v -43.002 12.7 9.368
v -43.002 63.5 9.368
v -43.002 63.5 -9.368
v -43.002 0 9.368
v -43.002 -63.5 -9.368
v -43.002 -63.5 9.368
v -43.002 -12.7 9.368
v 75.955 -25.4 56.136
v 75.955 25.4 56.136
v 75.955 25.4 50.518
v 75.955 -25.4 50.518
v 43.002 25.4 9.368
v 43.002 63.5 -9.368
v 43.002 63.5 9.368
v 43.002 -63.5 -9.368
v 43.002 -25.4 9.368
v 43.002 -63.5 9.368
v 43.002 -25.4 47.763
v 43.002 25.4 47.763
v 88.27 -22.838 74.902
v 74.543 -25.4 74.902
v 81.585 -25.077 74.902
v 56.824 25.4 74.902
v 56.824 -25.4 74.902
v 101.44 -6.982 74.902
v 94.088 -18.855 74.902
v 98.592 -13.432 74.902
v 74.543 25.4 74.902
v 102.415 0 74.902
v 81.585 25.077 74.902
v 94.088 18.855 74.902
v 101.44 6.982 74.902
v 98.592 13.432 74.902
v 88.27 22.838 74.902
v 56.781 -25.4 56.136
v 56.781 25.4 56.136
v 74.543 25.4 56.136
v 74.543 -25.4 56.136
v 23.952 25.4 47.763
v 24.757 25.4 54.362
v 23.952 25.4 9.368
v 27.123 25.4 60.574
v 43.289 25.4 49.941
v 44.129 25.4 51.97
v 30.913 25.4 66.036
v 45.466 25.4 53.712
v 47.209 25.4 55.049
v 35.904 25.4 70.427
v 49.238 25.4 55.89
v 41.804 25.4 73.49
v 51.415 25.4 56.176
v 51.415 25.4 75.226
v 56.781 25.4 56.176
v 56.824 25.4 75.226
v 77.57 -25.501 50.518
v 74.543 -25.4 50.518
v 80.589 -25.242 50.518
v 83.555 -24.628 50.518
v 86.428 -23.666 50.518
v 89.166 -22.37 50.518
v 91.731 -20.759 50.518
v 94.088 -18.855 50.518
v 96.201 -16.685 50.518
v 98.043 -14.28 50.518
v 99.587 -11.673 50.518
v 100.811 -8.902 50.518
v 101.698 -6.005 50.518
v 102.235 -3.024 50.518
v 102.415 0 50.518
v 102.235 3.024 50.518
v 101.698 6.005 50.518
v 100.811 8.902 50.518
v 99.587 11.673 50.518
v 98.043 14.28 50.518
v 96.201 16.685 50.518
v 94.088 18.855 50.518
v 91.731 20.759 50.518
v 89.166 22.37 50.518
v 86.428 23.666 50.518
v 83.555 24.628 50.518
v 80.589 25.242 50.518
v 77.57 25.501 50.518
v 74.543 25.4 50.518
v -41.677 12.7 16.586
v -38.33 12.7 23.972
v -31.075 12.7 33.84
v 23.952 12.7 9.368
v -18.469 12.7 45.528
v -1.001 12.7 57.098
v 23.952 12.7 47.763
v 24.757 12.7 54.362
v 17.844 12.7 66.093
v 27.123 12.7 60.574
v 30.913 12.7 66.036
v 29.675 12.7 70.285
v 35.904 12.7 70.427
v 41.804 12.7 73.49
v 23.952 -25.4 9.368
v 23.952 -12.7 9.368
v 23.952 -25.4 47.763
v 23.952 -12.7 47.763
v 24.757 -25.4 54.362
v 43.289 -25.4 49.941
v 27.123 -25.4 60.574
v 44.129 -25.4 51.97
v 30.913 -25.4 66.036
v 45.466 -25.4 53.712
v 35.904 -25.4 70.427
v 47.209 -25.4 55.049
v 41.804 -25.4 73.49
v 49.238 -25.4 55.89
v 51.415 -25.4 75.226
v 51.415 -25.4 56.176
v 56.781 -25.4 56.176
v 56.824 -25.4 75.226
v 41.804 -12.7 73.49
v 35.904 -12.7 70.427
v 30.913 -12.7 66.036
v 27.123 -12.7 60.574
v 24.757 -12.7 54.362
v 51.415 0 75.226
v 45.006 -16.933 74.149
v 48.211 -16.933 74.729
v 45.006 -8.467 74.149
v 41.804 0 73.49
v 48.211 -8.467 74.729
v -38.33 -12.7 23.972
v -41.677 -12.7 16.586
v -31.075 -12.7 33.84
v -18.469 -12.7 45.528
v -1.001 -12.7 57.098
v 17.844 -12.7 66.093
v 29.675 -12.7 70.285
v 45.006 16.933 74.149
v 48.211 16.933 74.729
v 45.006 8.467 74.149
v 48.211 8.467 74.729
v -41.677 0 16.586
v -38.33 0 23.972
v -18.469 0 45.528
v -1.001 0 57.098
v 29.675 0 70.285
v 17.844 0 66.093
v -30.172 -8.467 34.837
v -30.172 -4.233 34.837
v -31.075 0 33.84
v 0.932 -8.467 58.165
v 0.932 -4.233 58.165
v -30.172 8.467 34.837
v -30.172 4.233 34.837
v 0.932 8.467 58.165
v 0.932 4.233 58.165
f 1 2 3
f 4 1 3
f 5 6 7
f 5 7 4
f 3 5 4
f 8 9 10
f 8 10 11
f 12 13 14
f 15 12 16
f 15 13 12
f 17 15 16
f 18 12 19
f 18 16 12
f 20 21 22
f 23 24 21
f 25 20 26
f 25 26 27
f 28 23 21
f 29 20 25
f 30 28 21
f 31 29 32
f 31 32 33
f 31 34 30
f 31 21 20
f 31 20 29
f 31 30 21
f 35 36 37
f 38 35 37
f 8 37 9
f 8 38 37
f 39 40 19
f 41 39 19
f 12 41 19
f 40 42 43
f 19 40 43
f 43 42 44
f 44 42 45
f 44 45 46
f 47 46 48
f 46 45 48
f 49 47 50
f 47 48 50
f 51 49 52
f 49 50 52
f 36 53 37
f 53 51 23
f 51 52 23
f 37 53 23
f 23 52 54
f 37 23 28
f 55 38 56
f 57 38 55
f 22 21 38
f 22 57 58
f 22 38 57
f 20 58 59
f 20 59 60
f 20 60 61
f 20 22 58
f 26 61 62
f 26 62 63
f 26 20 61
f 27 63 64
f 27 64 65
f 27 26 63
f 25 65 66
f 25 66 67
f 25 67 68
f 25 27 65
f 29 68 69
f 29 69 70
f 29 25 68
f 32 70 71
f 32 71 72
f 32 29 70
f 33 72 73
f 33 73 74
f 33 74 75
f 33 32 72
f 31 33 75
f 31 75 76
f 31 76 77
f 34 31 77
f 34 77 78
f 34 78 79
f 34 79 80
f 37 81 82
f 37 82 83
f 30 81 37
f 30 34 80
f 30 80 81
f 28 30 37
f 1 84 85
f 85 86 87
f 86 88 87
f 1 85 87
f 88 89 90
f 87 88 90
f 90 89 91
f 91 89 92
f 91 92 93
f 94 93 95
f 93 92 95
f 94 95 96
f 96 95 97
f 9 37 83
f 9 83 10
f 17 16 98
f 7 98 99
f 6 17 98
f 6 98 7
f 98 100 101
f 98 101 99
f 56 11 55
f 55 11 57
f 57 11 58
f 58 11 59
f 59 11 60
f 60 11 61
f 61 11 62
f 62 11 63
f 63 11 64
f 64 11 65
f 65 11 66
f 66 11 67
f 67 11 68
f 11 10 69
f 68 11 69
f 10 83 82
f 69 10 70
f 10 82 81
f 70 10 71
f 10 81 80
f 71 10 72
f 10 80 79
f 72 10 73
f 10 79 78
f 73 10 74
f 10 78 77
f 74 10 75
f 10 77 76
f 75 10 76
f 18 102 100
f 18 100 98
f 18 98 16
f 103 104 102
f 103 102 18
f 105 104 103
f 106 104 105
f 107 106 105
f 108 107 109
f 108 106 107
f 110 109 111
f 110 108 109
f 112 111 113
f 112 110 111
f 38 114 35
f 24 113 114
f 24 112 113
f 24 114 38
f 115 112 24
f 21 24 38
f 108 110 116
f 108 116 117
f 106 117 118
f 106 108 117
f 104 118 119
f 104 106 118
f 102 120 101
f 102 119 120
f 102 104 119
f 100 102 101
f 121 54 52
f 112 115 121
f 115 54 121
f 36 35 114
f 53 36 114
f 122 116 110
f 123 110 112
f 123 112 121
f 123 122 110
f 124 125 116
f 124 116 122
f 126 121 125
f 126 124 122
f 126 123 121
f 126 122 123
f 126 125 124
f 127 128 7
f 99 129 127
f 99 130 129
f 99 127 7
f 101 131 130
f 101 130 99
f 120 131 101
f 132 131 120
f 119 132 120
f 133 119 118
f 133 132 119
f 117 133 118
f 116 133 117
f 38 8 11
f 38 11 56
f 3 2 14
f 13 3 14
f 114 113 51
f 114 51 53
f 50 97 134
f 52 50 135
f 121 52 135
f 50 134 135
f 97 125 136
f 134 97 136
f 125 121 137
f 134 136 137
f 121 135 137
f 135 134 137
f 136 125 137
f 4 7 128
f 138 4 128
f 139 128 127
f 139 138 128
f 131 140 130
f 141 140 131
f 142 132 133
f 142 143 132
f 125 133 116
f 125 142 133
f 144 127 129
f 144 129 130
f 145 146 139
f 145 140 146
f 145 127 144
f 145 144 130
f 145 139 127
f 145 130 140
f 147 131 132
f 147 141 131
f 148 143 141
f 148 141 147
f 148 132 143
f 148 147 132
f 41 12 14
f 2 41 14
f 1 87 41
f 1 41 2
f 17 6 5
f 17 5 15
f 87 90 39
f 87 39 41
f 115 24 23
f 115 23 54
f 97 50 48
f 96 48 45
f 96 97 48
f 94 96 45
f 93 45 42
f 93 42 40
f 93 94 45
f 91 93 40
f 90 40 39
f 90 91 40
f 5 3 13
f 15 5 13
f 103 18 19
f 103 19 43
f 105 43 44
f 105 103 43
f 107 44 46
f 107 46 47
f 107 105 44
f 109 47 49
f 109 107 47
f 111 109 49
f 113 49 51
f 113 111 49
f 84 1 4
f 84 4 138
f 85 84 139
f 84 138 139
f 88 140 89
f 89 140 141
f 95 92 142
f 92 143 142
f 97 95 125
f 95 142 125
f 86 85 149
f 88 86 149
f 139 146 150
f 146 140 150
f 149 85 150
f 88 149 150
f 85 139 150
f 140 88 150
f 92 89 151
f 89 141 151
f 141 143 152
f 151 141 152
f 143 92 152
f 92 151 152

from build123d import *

# Parameters (mm, degrees)
F1_DEPTH = 63.5
F2_DEPTH = 25.4
F3_DEPTH = 12.7
F4_W     = 19.1736370325
F4_H     = 18.7656953931
F5_DEPTH = 25.4
F8_DEPTH = 24.384


with BuildPart() as f1:
    # F0 (on Front) → F1 (new body, symmetric)
    with BuildSketch(Plane.XZ):
        Polygon((43.002218008, -9.3683367595), (43.002218008, 9.3683367595), (23.952218008, 9.3683367595), (-43.002218008, 9.3683367595), (-43.002218008, -9.3683367595), align=None)
    extrude(amount=F1_DEPTH, both=True)

    # F0 (on Front) → F2 (join, symmetric)
    with BuildSketch(Plane.XZ):
        with BuildLine():
            Line((23.952218008, 9.3683367595), (43.002218008, 9.3683367595))
            Line((43.002218008, 9.3683367595), (43.002218008, 47.7631762624))
            ThreePointArc((43.002218008, 47.7631762624), (45.4664077762, 53.712256621), (51.4154881348, 56.1764463891))
            Line((51.4154881348, 56.1764463891), (56.8243600428, 56.1764463891))
            Line((56.8243600428, 56.1764463891), (56.8243600428, 75.2264463891))
            Line((56.8243600428, 75.2264463891), (51.4154881348, 75.2264463891))
            add(Edge.make_bspline(
                [(41.8041992357, 73.4897059886), (45.002733463, 74.1877892991), (48.2117770705, 74.7703432953), (51.4154881348, 75.2264463891)],
                knots=[107.1334915157, 107.1334915157, 107.1334915157, 107.1334915157, 115.1173046821, 115.1173046821, 115.1173046821, 115.1173046821], degree=3))
            ThreePointArc((41.8041992357, 73.4897059886), (28.8523696739, 63.4200243288), (23.952218008, 47.7631762624))
            Line((23.952218008, 47.7631762624), (23.952218008, 9.3683367595))
        make_face()
    extrude(amount=F2_DEPTH, both=True)

    # F0 (on Front) → F3 (join, symmetric)
    with BuildSketch(Plane.XZ):
        with BuildLine():
            Line((-43.002218008, 9.3683367595), (23.952218008, 9.3683367595))
            Line((23.952218008, 9.3683367595), (23.952218008, 47.7631762624))
            ThreePointArc((23.952218008, 47.7631762624), (28.8523696739, 63.4200243288), (41.8041992357, 73.4897059886))
            add(Edge.make_bspline(
                [(-43.002218008, 9.3683367595), (-42.1446492068, 33.9519638821), (-1.1164118011, 64.1222394823), (41.8041992357, 73.4897059886)],
                knots=[0, 0, 0, 0, 107.1334915157, 107.1334915157, 107.1334915157, 107.1334915157], degree=3))
        make_face()
    extrude(amount=F3_DEPTH, both=True)

    # F4 (on Front) → F5 (join, symmetric)
    with BuildSketch(Plane.XZ):
        with Locations((66.3682073355, 65.5188672245)):
            Rectangle(F4_W, F4_H)
    extrude(amount=F5_DEPTH, both=True)

    # F7 (on face) → F8 (join)
    with BuildSketch(Plane.XY.offset(74.901714921)):
        with BuildLine():
            ThreePointArc((74.5427201599, -25.4), (94.0875248733, -18.8547135488), (102.4145857599, 0))
            ThreePointArc((102.4145857599, 0), (94.0875248733, 18.8547135488), (74.5427201599, 25.4))
            Line((74.5427201599, 25.4), (75.9550258517, 25.4))
            Line((75.9550258517, 25.4), (75.9550258517, -25.4))
            Line((75.9550258517, -25.4), (74.5427201599, -25.4))
        make_face()
    extrude(amount=-F8_DEPTH)


solid = f1.part
